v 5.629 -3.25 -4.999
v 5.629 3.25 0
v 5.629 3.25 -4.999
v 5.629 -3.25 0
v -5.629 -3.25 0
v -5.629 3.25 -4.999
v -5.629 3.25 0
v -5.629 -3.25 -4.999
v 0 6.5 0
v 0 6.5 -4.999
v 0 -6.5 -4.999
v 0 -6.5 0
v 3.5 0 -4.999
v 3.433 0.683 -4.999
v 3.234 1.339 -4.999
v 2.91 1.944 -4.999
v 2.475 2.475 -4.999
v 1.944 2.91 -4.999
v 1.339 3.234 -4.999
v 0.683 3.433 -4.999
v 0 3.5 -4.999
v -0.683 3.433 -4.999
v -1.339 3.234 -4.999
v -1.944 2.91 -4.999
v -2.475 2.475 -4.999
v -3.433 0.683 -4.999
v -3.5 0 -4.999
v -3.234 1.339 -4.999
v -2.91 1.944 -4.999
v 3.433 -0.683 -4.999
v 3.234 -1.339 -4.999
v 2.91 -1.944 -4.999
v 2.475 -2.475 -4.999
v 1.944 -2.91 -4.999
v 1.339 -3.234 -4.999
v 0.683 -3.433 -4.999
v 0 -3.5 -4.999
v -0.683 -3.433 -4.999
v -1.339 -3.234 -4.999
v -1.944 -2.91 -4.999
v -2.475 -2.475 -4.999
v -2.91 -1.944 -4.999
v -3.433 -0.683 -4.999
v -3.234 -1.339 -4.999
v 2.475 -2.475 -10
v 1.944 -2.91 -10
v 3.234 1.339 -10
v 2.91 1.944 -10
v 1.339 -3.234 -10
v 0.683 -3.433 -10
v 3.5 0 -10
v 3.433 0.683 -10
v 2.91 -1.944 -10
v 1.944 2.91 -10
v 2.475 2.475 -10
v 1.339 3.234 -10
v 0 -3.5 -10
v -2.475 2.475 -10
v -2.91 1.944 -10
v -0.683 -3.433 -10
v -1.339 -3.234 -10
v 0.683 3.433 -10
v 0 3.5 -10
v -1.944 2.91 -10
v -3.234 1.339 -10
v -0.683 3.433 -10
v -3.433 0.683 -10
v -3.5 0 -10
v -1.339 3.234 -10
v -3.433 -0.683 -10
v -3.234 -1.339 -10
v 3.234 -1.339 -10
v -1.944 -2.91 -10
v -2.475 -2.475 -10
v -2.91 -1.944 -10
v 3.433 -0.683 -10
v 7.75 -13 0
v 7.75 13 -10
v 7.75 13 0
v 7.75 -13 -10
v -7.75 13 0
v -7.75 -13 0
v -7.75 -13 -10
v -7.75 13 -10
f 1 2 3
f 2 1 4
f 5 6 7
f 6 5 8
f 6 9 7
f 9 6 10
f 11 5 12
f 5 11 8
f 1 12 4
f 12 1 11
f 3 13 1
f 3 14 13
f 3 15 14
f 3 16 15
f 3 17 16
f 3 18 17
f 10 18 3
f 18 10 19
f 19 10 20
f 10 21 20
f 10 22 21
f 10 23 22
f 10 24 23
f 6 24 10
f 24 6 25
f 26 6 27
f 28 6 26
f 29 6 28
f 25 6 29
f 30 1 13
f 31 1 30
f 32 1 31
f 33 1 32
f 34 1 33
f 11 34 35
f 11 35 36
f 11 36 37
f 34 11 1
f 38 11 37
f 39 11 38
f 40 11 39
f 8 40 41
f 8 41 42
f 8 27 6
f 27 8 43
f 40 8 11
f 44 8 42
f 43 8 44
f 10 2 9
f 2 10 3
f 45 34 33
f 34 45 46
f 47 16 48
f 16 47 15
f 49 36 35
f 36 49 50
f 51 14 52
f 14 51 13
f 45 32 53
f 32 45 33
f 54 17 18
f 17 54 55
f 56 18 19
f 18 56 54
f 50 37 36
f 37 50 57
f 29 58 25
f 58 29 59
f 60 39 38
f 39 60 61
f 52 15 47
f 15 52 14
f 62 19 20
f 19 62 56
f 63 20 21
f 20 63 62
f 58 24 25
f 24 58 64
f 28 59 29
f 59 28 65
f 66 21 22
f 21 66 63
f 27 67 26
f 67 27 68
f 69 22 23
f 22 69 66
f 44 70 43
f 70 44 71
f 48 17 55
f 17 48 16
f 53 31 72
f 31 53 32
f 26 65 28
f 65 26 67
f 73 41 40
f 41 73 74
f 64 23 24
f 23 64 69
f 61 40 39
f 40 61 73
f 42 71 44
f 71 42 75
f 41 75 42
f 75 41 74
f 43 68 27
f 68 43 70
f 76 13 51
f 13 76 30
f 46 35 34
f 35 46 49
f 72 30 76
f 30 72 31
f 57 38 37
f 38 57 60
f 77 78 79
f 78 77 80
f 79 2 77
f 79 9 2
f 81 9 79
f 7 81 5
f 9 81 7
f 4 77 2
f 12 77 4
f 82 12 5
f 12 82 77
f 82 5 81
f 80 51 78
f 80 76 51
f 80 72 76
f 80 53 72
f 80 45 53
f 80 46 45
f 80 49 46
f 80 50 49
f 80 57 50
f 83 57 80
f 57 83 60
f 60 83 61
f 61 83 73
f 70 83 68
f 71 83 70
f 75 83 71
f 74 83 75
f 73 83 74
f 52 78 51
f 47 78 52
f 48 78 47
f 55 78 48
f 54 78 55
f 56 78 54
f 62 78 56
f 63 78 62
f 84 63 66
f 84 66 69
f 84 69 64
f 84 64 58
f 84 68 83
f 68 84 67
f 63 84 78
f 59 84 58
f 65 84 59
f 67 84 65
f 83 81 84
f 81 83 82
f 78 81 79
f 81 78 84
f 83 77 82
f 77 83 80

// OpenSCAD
// file: ../config.scad
// ============================================================
// PROJECT CONFIGURATION
// Description: Global settings for best_fence
// ============================================================

// ============================================================
// RENDERING SETTINGS
// ============================================================

// Preview quality (lower = faster preview)
PREVIEW_FN = 32;

// Export quality (higher = smoother STL)
EXPORT_FN = 128;

// Current mode (set to true when exporting STL)
// Override from command line: openscad -D 'EXPORT_MODE=true' ...
EXPORT_MODE = false;

// Convenience variable - automatically use correct quality
$fn = EXPORT_MODE ? EXPORT_FN : PREVIEW_FN;

// ============================================================
// PROJECT DIMENSIONS (mm and degrees)
// ============================================================

// best fence dimensions
// TODO: create a model of the best fence for reference
BEST_FENCE_INTERIOR_WIDTH = 152.5;
BEST_FENCE_INTERIOR_HEIGHT = 15;
BEST_FENCE_OVERALL_HEIGHT = 25;
BEST_FENCE_WALL_THICKNESS = 5.5;
BEST_FENCE_INDEXING_LIP_LENGTH = 5;
BEST_FENCE_INDEXING_LIP_HEIGHT = 8.5;

// mount dimensions
MOUNT_HEIGHT = 32;
// MOUNT_VERTICAL_CLEARANCE is the vertical clearance between the highest point of 
// the mount and the top of the Best Fence. 
// Negative values means it will be below the top of the Best Fence.
MOUNT_VERTICAL_CLEARANCE = -2; 
MOUNT_REAR_SUPPORT_WIDTH = 10;

// toe clamp dimensions
TOE_CLAMP_LENGTH = 28;
TOE_CLAMP_BOTTOM_WIDTH = 17.5;
TOE_CLAMP_ANGLE = 70; 
TOE_CLAMP_HEIGHT = 16;
TOE_CLAMP_INSERT_WIDTH = TOE_CLAMP_BOTTOM_WIDTH - 2; // should be slightly smaller than the bottom width of the clamp body to fit snugly
TOE_CLAMP_INSERT_LENGTH = TOE_CLAMP_LENGTH - 2; // should be slightly smaller than the length of the clamp body to fit snugly
TOE_CLAMP_INSERT_HEIGHT = 10;

// bolt dimensions
BOLT_HEAD_RADIUS = 6.5;
BOLT_HEAD_HEIGHT = 5;
BOLT_SHANK_RADIUS = 3.5;
BOLT_SHANK_HEIGHT = 16;

// spring dimensions
SPRING_RADIUS = 6.5;
SPRING_HEIGHT = 13;

// screw mount dimensions
SCREW_MOUNT_WIDTH = 32;
SCREW_MOUNT_LENGTH = 32;

// screw dimensions
SCREW_HEAD_RADIUS = 5;
SCREW_SHANK_RADIUS = 3;
SCREW_HEAD_ANGLE = 30; 
SCREW_HEIGHT = 50;

// helping hand dimensions
HELPING_HAND_HEAD_HEIGHT = 20;
HELPING_HAND_HEAD_RADIUS = 15.5;

// ============================================================
// TOLERANCES (mm and degrees)
// ============================================================

TOE_CLAMP_TOLERANCE_LENGTH = 1;
TOE_CLAMP_TOLERANCE_WIDTH = -3;

EPSILON = 1e-3;

// ============================================================
// RENDERING HELPERS
// ============================================================

// Helper function to determine if we're in preview mode
function is_preview() = !EXPORT_MODE;

// Helper function to determine if we're in export mode
function is_export() = EXPORT_MODE;
// file: ../hardware/bolt.scad
// File: bolt.scad
//  A simple bolt component for holding the Best Fence, used by the [toe_clamp_body](parts/toe_clamp_body.scad)
// Includes:
//   use <hardware/bolt.scad>;

include <../config.scad>;

// Module: bolt
// Description: A simple bolt for holding the Best Fence, used by the [toe_clamp_body](parts/toe_clamp_body.scad)
//   This module creates a simple bolt with a hex head and no threads.
// Example(3D,Render):
//   bolt();
module bolt() {
    translate([0, 0, -BOLT_HEAD_HEIGHT]) {
        // rotate so the hexagon is flat on the top and bottom, not standing on a point
        rotate([0, 0, 90]) {
            // cheater way to make a hexagon by using a cylinder with 6 facets
            cylinder(h = BOLT_HEAD_HEIGHT, r = BOLT_HEAD_RADIUS, center = false, $fn=6);
        }
        translate([0, 0, -BOLT_SHANK_HEIGHT]) {
            cylinder(h = BOLT_SHANK_HEIGHT, r = BOLT_SHANK_RADIUS);
        }
    }
}

bolt();
// main file
// File: toe_clamp_insert.scad
//   A simple toe clamp component for holding the Best Fence
// Includes:
//   use <parts/toe_clamp_insert.scad>;

use <../hardware/bolt.scad>;

include <../config.scad>;

// Module: toe_clamp_insert
// Description: A simple toe clamp insert for holding the Best Fence, used by the [toe_clamp_body](parts/toe_clamp_body.scad)
//   This module creates a simple toe clamp insert that is designed to fit snugly inside the [toe_clamp_body](parts/toe_clamp_body.scad)
//   and provide a secure hold on the fence. The insert is designed to be used with a bolt that goes through the [toe_clamp_body](parts/toe_clamp_body.scad)
//   and secures the clamp to the fence. 
//   .
//   The insert is designed to be centered around 0,0, with the highest point at 0,0,0; 
///  meaning all children should be centered about 0,0; with the highest point slightly above 0,0,0 (to allow for a clean cut). 
//   .
//   The insert is designed to be made from a hard material like PLA or PETG for durability.
// Example(3D,Render):
//   use <hardware/bolt.scad>;
//   include <config.scad>;
//   toe_clamp_insert() {
//     translate([0, 0, EPSILON]) {
//       bolt();
//     }
//   }
module toe_clamp_insert() {
    difference() {
        translate([0, 0, - TOE_CLAMP_INSERT_HEIGHT/2]) {
            cube([TOE_CLAMP_INSERT_WIDTH, TOE_CLAMP_INSERT_LENGTH, TOE_CLAMP_INSERT_HEIGHT], center = true);
        }
        children();
    }
}

toe_clamp_insert() {
    translate([0, 0, EPSILON]) {
        bolt();
    }
}
